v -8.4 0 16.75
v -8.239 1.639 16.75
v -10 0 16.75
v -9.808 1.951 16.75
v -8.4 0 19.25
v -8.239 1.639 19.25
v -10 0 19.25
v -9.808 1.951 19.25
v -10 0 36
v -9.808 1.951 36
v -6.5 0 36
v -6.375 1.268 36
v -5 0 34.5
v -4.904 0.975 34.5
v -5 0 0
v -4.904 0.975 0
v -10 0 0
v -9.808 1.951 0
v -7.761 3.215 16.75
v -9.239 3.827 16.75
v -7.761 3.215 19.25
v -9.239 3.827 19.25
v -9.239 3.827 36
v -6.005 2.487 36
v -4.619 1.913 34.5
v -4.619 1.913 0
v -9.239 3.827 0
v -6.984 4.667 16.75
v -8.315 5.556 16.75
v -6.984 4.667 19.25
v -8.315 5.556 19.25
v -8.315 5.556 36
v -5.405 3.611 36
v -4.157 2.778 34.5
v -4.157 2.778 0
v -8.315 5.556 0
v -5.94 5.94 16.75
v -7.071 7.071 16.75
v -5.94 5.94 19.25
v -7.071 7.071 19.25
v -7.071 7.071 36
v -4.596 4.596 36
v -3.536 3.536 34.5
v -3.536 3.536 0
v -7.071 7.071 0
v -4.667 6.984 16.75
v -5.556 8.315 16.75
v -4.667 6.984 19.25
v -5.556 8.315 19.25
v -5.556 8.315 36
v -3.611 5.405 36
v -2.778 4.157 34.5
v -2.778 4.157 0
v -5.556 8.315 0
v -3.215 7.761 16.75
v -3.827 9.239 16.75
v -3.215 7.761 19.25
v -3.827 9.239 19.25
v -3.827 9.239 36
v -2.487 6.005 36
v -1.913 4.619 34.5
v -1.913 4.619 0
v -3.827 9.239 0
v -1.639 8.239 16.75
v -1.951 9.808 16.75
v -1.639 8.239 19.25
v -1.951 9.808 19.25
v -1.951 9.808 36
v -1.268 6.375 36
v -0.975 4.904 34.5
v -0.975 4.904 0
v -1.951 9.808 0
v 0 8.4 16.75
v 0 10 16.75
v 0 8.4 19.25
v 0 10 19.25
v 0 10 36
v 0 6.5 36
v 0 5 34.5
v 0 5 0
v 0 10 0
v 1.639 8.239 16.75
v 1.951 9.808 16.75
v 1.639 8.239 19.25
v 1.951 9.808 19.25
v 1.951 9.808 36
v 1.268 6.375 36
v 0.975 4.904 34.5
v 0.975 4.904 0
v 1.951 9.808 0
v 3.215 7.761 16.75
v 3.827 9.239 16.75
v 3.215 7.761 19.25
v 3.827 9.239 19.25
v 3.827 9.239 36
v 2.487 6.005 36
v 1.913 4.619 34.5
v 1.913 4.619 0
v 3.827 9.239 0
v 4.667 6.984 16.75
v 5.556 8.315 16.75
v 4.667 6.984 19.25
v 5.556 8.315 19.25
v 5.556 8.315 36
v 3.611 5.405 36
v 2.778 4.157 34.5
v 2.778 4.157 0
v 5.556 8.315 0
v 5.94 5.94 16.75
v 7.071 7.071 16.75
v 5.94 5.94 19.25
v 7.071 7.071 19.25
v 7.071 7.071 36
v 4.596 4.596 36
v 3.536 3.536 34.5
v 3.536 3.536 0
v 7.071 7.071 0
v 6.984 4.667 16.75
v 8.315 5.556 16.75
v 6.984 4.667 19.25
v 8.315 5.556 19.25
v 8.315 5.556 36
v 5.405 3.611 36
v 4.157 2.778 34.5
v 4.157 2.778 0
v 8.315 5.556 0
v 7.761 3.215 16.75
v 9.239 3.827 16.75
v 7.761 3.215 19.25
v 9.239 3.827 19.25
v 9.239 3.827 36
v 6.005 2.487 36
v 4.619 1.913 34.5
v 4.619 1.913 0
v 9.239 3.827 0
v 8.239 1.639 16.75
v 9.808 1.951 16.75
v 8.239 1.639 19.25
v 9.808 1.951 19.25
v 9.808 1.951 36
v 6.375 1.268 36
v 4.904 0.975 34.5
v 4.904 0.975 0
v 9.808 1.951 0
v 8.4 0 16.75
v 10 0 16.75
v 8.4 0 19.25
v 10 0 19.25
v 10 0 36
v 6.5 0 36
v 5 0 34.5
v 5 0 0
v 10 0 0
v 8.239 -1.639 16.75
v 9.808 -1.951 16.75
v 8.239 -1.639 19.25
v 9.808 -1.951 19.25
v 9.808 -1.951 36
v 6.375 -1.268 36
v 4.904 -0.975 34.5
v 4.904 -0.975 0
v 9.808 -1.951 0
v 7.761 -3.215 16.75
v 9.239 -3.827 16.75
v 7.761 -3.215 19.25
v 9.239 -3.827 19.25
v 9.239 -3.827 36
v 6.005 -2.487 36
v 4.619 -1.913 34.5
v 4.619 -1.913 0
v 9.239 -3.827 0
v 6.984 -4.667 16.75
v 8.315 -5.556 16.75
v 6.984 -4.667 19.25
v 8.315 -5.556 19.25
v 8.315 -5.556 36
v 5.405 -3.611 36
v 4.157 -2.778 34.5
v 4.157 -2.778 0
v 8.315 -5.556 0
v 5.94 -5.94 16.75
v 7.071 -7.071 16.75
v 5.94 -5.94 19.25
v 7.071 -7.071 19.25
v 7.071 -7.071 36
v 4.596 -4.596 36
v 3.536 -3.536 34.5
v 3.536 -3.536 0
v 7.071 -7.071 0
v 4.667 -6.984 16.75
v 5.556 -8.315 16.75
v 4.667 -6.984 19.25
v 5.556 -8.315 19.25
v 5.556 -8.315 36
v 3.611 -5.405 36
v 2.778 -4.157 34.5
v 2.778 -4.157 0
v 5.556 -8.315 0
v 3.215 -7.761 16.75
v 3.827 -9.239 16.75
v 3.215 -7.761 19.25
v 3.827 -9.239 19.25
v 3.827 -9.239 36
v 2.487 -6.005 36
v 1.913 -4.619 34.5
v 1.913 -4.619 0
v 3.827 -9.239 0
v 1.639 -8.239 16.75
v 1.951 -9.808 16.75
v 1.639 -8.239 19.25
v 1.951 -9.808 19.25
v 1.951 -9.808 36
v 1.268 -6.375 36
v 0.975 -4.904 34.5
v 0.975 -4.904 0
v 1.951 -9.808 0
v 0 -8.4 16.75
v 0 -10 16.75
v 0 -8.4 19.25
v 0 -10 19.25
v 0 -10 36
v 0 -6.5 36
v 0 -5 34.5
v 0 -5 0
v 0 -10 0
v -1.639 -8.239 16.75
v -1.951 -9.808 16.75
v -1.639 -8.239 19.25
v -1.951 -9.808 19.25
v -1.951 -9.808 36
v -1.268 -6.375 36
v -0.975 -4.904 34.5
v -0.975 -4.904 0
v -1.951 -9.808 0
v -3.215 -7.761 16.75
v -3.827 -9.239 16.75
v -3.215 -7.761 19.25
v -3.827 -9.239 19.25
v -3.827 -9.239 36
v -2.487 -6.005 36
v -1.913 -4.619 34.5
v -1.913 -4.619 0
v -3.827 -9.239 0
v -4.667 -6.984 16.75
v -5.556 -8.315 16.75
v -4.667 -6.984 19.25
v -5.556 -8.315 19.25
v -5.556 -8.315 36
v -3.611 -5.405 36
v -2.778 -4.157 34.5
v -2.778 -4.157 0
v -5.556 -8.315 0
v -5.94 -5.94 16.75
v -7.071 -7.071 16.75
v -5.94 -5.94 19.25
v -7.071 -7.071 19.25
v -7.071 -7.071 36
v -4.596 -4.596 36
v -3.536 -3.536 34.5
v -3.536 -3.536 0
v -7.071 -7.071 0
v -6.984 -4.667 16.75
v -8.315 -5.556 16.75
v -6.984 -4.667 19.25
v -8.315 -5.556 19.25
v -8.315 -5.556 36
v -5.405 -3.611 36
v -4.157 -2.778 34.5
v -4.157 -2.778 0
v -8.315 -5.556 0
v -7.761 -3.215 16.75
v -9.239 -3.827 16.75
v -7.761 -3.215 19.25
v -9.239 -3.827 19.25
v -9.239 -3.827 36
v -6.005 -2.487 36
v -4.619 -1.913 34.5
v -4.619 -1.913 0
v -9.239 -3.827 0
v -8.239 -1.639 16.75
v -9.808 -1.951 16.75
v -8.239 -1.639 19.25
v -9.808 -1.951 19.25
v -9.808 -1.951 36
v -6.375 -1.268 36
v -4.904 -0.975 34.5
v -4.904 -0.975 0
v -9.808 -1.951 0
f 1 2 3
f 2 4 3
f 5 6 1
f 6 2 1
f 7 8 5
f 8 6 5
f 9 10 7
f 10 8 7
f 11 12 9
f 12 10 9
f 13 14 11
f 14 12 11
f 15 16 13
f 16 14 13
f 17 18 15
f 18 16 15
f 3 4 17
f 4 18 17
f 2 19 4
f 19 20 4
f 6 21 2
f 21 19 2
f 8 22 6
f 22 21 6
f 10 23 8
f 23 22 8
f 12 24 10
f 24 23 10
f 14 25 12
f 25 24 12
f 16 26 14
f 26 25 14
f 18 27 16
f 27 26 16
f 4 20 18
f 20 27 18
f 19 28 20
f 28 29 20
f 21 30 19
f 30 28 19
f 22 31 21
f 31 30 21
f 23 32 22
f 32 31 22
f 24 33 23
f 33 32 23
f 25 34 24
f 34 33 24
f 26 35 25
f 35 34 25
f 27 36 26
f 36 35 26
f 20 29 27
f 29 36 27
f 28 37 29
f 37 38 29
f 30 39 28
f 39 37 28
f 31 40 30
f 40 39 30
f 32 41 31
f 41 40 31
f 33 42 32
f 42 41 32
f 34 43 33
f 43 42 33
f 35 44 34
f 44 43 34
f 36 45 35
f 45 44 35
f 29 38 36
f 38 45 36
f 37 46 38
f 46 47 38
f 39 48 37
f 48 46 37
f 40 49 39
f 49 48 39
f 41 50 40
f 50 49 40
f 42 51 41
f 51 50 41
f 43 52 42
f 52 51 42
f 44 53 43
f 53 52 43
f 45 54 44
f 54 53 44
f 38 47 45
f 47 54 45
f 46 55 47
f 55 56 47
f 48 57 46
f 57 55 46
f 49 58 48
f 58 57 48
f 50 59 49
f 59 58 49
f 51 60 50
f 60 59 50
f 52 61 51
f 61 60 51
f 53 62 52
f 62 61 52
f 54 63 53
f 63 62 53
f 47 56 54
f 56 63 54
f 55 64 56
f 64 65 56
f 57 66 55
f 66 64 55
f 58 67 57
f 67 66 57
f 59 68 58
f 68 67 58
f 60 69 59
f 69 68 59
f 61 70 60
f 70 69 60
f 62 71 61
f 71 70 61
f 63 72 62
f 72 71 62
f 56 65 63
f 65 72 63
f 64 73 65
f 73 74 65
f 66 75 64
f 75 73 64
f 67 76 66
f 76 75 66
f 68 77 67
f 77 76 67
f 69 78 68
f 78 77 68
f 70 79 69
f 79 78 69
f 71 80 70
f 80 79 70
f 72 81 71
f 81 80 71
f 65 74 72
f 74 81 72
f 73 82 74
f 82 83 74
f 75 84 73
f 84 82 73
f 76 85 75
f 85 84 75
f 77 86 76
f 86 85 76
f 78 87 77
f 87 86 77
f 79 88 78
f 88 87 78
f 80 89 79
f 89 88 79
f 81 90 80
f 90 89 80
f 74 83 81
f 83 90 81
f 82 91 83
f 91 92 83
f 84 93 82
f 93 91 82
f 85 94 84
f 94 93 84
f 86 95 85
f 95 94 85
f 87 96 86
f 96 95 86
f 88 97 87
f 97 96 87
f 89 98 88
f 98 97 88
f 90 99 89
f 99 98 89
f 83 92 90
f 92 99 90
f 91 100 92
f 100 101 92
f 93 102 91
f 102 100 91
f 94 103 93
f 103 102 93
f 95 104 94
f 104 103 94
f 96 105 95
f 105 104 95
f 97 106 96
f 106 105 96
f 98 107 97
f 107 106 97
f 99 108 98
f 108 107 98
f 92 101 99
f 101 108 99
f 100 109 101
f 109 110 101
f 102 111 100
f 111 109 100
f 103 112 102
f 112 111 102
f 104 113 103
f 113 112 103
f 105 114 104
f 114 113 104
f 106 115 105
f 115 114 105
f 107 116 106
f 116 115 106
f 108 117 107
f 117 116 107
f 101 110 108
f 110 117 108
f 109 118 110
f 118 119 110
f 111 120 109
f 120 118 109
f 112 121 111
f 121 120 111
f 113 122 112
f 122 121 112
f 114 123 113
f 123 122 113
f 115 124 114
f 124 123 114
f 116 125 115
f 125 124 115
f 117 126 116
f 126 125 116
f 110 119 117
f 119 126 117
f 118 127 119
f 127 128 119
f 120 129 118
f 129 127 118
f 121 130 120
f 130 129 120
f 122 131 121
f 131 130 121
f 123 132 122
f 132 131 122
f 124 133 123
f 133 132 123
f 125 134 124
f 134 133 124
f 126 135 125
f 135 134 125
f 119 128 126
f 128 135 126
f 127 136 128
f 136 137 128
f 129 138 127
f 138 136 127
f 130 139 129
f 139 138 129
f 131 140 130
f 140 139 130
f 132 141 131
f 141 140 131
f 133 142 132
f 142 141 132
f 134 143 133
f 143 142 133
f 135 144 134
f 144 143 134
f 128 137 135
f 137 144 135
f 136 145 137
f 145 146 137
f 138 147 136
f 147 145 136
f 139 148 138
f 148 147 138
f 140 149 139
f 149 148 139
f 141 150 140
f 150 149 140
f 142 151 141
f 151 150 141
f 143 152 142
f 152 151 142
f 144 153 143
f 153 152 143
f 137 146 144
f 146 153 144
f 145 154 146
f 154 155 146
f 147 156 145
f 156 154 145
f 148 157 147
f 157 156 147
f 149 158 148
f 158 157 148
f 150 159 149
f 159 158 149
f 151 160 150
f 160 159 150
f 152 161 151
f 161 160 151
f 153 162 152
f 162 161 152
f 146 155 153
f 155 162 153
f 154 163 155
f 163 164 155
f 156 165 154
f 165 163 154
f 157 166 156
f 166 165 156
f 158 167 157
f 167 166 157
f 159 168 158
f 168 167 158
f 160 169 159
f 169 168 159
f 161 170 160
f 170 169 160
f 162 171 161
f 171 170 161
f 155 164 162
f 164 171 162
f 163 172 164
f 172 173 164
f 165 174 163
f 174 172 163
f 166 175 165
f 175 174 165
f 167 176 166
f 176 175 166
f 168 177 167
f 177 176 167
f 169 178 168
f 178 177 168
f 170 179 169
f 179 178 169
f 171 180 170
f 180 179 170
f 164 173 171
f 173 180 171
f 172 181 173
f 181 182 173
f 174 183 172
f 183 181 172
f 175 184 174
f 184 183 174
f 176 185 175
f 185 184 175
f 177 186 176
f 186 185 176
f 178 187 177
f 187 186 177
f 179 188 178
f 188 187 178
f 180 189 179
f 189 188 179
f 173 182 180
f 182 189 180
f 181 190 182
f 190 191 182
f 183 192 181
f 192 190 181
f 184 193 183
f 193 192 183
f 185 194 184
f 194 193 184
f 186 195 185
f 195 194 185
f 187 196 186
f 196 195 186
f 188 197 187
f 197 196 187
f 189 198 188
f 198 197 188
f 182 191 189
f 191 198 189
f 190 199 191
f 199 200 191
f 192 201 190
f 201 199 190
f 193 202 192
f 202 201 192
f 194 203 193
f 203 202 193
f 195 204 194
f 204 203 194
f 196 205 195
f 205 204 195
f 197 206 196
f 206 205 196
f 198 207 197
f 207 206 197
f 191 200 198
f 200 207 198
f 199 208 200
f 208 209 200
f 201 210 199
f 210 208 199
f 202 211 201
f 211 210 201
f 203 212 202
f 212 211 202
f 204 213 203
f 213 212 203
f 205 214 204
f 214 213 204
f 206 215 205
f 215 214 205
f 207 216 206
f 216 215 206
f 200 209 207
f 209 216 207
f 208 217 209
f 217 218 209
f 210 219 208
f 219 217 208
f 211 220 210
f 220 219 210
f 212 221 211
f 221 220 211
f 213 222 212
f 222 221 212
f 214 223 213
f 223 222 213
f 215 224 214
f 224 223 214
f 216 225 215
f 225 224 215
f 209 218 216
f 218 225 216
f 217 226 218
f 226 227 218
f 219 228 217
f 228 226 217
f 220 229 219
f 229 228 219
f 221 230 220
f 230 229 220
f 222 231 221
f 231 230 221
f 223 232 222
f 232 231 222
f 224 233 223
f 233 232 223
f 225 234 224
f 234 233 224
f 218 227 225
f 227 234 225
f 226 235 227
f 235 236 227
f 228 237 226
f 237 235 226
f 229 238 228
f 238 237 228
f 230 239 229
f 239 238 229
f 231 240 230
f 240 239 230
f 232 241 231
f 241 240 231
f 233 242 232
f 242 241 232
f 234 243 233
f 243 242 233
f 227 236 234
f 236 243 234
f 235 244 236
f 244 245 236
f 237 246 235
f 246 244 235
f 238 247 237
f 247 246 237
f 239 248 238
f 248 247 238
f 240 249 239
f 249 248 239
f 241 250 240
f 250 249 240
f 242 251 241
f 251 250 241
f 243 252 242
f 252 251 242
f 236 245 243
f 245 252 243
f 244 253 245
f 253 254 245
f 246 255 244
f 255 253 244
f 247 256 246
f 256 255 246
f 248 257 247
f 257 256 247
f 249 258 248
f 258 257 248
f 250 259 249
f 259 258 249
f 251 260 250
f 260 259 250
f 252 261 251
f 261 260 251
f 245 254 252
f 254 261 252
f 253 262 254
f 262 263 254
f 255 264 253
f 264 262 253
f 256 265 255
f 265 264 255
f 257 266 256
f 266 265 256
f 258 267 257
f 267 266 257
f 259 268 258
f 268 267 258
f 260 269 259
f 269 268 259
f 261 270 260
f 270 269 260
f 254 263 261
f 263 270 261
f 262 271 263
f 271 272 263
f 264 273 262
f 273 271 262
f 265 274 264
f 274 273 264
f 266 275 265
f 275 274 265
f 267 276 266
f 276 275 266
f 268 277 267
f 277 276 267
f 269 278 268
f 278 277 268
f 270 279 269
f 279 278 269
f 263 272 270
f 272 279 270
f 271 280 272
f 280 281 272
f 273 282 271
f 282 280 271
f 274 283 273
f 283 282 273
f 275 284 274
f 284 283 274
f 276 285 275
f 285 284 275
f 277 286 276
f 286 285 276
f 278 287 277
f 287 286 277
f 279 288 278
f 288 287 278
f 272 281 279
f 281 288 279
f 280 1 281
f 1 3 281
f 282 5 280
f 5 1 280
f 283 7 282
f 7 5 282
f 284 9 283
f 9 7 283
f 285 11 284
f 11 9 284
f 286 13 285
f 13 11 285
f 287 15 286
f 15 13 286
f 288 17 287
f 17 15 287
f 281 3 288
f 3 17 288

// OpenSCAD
$fn = 32;

// ----------------------------------------------------------------------
// Grooved revolve: thread_relief, bore R5
// ----------------------------------------------------------------------

// --- parameters (mm) ---
bore_r = 5;               // bore radius
outer_r = 10;             // outer radius of the body
total_h = 36;             // overall height, Z
wall = 5;                 // radial wall thickness
groove_w = 2.5;           // groove width
groove_d = 1.6;           // groove depth
grooves = 1;              // number of outer grooves
relief = 1.5;             // thread relief leg at the bore mouth
relief_angle = 45;        // thread relief chamfer angle, degrees

bbox_x = 2 * outer_r;  // full diameter
bore_d = 2 * bore_r;  // bore diameter
body_d = 2 * outer_r;  // body diameter
revolve_angle = 360;  // full turn around the Z axis

profile = [[5, 0], [10, 0], [10, 16.75], [8.4, 16.75], [8.4, 19.25], [10, 19.25], [10, 36], [6.5, 36], [5, 34.5]];  // primary outline, 9 points, counter clockwise

// --- the one profile operation ---
rotate_extrude(angle = revolve_angle) polygon(points = profile);
